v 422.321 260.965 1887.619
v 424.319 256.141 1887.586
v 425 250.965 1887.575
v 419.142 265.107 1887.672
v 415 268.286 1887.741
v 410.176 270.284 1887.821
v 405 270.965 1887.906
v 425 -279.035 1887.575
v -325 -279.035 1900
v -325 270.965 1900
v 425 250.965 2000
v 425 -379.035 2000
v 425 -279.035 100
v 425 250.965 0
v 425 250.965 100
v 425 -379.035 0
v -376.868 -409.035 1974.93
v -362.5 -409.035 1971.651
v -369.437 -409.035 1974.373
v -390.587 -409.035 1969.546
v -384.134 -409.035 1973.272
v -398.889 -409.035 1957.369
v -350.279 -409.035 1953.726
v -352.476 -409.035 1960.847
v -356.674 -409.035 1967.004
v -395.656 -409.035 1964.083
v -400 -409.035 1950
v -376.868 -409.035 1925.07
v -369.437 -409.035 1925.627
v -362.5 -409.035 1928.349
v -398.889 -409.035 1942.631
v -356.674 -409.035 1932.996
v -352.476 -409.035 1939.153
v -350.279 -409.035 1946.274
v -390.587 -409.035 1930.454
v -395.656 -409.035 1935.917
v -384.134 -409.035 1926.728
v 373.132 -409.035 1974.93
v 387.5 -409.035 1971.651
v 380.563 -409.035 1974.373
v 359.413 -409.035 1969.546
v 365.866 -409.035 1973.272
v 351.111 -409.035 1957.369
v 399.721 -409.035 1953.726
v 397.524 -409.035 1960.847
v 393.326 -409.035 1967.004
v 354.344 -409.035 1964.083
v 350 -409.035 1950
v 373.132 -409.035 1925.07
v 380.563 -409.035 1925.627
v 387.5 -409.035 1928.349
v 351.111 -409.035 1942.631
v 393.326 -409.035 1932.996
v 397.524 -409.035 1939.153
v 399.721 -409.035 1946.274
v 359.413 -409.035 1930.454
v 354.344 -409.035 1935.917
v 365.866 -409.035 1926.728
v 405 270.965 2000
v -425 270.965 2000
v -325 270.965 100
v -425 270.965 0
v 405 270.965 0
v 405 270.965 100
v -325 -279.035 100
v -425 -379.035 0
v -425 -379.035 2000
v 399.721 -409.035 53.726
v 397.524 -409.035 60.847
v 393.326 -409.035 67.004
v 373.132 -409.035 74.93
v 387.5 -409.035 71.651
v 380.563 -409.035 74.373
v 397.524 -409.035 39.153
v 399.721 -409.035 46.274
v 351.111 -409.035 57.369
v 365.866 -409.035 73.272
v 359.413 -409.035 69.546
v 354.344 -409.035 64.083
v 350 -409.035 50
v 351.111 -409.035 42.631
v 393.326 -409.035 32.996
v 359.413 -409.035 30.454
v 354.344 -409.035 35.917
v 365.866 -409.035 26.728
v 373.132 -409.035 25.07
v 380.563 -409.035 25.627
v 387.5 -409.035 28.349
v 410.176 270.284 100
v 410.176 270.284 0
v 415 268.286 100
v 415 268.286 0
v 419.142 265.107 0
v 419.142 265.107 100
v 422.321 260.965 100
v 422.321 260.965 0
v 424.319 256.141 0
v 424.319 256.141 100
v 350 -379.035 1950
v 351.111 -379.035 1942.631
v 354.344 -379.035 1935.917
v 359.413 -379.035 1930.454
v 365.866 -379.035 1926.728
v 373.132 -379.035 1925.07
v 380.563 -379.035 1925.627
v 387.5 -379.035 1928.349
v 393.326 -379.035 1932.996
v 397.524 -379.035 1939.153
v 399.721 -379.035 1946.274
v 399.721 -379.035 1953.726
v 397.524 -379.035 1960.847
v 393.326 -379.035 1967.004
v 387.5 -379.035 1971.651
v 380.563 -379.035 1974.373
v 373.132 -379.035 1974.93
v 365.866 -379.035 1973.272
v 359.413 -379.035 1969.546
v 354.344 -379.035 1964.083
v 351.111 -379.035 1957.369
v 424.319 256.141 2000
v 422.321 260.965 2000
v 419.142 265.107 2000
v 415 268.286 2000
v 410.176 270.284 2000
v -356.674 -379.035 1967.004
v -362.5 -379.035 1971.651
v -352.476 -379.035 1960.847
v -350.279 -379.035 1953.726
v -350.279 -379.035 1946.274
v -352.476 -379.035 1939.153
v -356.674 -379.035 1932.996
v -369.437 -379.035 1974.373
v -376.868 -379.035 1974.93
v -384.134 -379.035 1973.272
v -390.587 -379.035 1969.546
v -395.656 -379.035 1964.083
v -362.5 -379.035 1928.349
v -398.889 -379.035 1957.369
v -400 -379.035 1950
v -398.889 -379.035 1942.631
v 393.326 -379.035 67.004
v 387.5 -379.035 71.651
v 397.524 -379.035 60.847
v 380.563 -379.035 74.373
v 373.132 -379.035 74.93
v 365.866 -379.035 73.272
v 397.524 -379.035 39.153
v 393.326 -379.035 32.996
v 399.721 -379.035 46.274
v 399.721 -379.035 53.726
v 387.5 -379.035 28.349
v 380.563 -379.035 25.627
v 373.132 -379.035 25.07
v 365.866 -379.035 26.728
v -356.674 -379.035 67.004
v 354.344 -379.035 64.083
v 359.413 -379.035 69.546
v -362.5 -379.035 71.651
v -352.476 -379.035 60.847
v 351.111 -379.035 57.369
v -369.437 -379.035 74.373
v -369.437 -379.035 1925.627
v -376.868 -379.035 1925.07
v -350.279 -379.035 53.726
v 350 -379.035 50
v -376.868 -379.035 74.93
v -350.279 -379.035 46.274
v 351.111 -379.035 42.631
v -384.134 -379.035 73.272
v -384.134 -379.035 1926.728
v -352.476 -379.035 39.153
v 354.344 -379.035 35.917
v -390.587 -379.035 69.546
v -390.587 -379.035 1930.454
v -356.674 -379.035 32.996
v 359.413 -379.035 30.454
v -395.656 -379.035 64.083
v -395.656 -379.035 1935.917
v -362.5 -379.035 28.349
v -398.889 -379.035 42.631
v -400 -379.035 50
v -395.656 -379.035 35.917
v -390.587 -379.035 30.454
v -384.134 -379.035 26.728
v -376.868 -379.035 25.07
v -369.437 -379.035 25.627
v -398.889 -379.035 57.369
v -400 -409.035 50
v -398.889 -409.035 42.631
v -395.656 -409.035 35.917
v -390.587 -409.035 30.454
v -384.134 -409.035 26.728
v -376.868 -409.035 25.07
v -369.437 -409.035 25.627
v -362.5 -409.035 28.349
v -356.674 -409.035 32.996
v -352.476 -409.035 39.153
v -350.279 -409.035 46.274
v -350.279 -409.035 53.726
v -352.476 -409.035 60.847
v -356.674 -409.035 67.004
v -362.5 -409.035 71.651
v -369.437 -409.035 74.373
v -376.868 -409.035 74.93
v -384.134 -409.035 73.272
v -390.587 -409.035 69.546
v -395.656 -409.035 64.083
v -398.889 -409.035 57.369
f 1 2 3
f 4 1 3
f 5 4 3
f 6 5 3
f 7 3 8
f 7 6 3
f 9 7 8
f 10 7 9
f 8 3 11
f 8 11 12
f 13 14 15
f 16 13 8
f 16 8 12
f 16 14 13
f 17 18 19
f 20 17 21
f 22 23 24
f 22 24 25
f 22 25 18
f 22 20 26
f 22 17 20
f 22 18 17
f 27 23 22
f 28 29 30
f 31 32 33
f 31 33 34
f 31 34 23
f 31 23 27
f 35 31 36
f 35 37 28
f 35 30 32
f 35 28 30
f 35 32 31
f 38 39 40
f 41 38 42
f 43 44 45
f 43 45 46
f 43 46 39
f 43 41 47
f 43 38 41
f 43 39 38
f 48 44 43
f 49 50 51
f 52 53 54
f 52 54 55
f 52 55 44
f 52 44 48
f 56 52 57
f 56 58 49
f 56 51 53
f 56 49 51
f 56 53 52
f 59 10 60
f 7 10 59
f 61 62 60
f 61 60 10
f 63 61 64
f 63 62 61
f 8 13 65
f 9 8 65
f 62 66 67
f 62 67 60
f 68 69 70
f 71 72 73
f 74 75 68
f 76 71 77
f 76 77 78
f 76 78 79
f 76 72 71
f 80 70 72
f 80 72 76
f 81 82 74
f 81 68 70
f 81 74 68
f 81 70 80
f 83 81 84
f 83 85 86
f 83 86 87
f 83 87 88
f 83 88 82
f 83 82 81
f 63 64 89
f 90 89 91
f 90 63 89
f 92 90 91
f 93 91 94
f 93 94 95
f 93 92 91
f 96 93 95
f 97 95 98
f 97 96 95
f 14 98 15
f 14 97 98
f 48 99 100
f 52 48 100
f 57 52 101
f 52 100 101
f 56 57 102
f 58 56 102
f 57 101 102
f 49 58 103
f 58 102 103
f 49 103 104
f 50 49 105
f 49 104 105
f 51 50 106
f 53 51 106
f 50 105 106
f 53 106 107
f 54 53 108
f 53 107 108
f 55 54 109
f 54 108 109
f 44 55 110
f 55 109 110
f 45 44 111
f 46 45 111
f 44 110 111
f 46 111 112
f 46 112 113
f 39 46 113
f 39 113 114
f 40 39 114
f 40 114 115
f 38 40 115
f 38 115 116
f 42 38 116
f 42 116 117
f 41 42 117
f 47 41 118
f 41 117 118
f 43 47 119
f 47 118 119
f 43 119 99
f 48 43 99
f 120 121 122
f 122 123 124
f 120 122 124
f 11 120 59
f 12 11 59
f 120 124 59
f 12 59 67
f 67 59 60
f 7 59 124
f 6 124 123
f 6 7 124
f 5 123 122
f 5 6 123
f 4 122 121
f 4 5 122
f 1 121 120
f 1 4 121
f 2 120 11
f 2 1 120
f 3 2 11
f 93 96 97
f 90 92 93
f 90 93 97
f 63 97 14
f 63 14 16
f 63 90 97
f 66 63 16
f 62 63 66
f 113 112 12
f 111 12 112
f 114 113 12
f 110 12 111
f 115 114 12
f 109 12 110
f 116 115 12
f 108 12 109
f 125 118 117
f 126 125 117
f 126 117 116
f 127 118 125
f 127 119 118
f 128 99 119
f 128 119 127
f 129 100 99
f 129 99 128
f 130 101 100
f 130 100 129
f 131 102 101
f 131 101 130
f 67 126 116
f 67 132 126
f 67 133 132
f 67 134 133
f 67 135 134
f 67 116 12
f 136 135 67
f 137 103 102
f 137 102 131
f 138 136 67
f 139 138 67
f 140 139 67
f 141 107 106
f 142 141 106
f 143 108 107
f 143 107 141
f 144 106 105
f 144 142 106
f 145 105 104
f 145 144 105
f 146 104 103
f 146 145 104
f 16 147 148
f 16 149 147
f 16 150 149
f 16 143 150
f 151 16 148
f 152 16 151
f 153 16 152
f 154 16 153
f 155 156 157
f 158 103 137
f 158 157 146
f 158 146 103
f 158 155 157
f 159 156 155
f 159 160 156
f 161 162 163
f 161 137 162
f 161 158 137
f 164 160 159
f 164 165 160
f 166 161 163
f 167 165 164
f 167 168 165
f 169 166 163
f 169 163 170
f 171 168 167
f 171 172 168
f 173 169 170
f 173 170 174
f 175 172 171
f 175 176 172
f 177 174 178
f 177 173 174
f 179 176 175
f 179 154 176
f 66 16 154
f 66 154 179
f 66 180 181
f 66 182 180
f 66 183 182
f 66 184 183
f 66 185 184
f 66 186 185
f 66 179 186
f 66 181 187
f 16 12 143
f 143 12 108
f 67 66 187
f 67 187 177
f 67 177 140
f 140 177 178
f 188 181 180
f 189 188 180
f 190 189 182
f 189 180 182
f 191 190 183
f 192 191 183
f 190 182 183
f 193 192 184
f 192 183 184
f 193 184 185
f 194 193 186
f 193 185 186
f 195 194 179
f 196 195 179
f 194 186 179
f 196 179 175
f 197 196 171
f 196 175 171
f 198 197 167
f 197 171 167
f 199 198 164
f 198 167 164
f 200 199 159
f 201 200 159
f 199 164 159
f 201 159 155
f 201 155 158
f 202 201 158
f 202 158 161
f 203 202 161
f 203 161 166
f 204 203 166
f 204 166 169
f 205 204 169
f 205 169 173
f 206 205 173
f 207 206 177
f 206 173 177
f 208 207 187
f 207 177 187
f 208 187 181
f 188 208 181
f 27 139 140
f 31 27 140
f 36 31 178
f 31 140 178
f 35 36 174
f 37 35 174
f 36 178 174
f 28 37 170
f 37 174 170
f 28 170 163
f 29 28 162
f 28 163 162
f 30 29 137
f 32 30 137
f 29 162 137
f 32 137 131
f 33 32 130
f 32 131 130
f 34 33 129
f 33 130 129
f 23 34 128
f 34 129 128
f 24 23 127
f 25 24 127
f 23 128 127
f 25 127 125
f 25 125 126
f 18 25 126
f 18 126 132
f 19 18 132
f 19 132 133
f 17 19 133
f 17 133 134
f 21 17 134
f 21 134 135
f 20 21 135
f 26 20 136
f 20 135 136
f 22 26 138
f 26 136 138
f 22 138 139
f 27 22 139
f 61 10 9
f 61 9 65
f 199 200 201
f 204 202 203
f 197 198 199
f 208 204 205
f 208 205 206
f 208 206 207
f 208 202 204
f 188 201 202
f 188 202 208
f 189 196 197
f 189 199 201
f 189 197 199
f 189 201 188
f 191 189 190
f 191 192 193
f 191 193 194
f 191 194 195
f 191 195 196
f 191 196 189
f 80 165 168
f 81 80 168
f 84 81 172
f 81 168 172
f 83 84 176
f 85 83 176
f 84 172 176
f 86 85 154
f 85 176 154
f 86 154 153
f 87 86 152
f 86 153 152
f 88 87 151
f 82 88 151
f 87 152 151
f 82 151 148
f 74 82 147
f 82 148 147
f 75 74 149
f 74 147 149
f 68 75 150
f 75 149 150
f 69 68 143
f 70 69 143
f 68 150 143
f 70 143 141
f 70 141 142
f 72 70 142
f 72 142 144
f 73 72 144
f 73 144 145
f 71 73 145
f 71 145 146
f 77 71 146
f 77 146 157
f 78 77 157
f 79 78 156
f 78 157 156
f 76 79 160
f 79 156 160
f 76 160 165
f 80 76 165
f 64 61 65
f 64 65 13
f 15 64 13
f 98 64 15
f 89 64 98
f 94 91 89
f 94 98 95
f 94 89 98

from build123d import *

# Parameters (mm, degrees)
BOSS_EXTRUDE1_DEPTH = 2000
CUT_EXTRUDE1_DEPTH  = 550
SKETCH4_R           = 25
BOSS_EXTRUDE2_DEPTH = 30


with BuildPart() as part:
    # Sketch1 → Boss-Extrude1 (new body)
    with BuildSketch(Plane.XY):
        with BuildLine():
            Line((-425, 270.9650644), (405, 270.9650644))
            ThreePointArc((405, 270.9650644), (419.142135624, 265.107200024), (425, 250.9650644))
            Line((425, 250.9650644), (425, -379.0349356))
            Line((425, -379.0349356), (-425, -379.0349356))
            Line((-425, -379.0349356), (-425, 270.9650644))
        make_face()
    extrude(amount=BOSS_EXTRUDE1_DEPTH)

    # Sketch3 → Cut-Extrude1 (cut)
    with BuildSketch(Plane(origin=(0, 270.9650644, 0), x_dir=(1, 0, 0), z_dir=(0, 1, 0))):
        Polygon((-325, -100), (425, -100), (425, -1887.575015641), (-325, -1900), align=None)
    extrude(amount=-CUT_EXTRUDE1_DEPTH, mode=Mode.SUBTRACT)

    # Sketch4 → Boss-Extrude2 (add)
    with BuildSketch(Plane(origin=(0, -379.0349356, 0), x_dir=(-1, 0, 0), z_dir=(0, -1, 0))):
        with Locations((375, -1950)):
            Circle(SKETCH4_R)
        with Locations((-375, -1950)):
            Circle(SKETCH4_R)
        with Locations((375, -50)):
            Circle(SKETCH4_R)
        with Locations((-375, -50)):
            Circle(SKETCH4_R)
    extrude(amount=BOSS_EXTRUDE2_DEPTH)


solid = part.part
